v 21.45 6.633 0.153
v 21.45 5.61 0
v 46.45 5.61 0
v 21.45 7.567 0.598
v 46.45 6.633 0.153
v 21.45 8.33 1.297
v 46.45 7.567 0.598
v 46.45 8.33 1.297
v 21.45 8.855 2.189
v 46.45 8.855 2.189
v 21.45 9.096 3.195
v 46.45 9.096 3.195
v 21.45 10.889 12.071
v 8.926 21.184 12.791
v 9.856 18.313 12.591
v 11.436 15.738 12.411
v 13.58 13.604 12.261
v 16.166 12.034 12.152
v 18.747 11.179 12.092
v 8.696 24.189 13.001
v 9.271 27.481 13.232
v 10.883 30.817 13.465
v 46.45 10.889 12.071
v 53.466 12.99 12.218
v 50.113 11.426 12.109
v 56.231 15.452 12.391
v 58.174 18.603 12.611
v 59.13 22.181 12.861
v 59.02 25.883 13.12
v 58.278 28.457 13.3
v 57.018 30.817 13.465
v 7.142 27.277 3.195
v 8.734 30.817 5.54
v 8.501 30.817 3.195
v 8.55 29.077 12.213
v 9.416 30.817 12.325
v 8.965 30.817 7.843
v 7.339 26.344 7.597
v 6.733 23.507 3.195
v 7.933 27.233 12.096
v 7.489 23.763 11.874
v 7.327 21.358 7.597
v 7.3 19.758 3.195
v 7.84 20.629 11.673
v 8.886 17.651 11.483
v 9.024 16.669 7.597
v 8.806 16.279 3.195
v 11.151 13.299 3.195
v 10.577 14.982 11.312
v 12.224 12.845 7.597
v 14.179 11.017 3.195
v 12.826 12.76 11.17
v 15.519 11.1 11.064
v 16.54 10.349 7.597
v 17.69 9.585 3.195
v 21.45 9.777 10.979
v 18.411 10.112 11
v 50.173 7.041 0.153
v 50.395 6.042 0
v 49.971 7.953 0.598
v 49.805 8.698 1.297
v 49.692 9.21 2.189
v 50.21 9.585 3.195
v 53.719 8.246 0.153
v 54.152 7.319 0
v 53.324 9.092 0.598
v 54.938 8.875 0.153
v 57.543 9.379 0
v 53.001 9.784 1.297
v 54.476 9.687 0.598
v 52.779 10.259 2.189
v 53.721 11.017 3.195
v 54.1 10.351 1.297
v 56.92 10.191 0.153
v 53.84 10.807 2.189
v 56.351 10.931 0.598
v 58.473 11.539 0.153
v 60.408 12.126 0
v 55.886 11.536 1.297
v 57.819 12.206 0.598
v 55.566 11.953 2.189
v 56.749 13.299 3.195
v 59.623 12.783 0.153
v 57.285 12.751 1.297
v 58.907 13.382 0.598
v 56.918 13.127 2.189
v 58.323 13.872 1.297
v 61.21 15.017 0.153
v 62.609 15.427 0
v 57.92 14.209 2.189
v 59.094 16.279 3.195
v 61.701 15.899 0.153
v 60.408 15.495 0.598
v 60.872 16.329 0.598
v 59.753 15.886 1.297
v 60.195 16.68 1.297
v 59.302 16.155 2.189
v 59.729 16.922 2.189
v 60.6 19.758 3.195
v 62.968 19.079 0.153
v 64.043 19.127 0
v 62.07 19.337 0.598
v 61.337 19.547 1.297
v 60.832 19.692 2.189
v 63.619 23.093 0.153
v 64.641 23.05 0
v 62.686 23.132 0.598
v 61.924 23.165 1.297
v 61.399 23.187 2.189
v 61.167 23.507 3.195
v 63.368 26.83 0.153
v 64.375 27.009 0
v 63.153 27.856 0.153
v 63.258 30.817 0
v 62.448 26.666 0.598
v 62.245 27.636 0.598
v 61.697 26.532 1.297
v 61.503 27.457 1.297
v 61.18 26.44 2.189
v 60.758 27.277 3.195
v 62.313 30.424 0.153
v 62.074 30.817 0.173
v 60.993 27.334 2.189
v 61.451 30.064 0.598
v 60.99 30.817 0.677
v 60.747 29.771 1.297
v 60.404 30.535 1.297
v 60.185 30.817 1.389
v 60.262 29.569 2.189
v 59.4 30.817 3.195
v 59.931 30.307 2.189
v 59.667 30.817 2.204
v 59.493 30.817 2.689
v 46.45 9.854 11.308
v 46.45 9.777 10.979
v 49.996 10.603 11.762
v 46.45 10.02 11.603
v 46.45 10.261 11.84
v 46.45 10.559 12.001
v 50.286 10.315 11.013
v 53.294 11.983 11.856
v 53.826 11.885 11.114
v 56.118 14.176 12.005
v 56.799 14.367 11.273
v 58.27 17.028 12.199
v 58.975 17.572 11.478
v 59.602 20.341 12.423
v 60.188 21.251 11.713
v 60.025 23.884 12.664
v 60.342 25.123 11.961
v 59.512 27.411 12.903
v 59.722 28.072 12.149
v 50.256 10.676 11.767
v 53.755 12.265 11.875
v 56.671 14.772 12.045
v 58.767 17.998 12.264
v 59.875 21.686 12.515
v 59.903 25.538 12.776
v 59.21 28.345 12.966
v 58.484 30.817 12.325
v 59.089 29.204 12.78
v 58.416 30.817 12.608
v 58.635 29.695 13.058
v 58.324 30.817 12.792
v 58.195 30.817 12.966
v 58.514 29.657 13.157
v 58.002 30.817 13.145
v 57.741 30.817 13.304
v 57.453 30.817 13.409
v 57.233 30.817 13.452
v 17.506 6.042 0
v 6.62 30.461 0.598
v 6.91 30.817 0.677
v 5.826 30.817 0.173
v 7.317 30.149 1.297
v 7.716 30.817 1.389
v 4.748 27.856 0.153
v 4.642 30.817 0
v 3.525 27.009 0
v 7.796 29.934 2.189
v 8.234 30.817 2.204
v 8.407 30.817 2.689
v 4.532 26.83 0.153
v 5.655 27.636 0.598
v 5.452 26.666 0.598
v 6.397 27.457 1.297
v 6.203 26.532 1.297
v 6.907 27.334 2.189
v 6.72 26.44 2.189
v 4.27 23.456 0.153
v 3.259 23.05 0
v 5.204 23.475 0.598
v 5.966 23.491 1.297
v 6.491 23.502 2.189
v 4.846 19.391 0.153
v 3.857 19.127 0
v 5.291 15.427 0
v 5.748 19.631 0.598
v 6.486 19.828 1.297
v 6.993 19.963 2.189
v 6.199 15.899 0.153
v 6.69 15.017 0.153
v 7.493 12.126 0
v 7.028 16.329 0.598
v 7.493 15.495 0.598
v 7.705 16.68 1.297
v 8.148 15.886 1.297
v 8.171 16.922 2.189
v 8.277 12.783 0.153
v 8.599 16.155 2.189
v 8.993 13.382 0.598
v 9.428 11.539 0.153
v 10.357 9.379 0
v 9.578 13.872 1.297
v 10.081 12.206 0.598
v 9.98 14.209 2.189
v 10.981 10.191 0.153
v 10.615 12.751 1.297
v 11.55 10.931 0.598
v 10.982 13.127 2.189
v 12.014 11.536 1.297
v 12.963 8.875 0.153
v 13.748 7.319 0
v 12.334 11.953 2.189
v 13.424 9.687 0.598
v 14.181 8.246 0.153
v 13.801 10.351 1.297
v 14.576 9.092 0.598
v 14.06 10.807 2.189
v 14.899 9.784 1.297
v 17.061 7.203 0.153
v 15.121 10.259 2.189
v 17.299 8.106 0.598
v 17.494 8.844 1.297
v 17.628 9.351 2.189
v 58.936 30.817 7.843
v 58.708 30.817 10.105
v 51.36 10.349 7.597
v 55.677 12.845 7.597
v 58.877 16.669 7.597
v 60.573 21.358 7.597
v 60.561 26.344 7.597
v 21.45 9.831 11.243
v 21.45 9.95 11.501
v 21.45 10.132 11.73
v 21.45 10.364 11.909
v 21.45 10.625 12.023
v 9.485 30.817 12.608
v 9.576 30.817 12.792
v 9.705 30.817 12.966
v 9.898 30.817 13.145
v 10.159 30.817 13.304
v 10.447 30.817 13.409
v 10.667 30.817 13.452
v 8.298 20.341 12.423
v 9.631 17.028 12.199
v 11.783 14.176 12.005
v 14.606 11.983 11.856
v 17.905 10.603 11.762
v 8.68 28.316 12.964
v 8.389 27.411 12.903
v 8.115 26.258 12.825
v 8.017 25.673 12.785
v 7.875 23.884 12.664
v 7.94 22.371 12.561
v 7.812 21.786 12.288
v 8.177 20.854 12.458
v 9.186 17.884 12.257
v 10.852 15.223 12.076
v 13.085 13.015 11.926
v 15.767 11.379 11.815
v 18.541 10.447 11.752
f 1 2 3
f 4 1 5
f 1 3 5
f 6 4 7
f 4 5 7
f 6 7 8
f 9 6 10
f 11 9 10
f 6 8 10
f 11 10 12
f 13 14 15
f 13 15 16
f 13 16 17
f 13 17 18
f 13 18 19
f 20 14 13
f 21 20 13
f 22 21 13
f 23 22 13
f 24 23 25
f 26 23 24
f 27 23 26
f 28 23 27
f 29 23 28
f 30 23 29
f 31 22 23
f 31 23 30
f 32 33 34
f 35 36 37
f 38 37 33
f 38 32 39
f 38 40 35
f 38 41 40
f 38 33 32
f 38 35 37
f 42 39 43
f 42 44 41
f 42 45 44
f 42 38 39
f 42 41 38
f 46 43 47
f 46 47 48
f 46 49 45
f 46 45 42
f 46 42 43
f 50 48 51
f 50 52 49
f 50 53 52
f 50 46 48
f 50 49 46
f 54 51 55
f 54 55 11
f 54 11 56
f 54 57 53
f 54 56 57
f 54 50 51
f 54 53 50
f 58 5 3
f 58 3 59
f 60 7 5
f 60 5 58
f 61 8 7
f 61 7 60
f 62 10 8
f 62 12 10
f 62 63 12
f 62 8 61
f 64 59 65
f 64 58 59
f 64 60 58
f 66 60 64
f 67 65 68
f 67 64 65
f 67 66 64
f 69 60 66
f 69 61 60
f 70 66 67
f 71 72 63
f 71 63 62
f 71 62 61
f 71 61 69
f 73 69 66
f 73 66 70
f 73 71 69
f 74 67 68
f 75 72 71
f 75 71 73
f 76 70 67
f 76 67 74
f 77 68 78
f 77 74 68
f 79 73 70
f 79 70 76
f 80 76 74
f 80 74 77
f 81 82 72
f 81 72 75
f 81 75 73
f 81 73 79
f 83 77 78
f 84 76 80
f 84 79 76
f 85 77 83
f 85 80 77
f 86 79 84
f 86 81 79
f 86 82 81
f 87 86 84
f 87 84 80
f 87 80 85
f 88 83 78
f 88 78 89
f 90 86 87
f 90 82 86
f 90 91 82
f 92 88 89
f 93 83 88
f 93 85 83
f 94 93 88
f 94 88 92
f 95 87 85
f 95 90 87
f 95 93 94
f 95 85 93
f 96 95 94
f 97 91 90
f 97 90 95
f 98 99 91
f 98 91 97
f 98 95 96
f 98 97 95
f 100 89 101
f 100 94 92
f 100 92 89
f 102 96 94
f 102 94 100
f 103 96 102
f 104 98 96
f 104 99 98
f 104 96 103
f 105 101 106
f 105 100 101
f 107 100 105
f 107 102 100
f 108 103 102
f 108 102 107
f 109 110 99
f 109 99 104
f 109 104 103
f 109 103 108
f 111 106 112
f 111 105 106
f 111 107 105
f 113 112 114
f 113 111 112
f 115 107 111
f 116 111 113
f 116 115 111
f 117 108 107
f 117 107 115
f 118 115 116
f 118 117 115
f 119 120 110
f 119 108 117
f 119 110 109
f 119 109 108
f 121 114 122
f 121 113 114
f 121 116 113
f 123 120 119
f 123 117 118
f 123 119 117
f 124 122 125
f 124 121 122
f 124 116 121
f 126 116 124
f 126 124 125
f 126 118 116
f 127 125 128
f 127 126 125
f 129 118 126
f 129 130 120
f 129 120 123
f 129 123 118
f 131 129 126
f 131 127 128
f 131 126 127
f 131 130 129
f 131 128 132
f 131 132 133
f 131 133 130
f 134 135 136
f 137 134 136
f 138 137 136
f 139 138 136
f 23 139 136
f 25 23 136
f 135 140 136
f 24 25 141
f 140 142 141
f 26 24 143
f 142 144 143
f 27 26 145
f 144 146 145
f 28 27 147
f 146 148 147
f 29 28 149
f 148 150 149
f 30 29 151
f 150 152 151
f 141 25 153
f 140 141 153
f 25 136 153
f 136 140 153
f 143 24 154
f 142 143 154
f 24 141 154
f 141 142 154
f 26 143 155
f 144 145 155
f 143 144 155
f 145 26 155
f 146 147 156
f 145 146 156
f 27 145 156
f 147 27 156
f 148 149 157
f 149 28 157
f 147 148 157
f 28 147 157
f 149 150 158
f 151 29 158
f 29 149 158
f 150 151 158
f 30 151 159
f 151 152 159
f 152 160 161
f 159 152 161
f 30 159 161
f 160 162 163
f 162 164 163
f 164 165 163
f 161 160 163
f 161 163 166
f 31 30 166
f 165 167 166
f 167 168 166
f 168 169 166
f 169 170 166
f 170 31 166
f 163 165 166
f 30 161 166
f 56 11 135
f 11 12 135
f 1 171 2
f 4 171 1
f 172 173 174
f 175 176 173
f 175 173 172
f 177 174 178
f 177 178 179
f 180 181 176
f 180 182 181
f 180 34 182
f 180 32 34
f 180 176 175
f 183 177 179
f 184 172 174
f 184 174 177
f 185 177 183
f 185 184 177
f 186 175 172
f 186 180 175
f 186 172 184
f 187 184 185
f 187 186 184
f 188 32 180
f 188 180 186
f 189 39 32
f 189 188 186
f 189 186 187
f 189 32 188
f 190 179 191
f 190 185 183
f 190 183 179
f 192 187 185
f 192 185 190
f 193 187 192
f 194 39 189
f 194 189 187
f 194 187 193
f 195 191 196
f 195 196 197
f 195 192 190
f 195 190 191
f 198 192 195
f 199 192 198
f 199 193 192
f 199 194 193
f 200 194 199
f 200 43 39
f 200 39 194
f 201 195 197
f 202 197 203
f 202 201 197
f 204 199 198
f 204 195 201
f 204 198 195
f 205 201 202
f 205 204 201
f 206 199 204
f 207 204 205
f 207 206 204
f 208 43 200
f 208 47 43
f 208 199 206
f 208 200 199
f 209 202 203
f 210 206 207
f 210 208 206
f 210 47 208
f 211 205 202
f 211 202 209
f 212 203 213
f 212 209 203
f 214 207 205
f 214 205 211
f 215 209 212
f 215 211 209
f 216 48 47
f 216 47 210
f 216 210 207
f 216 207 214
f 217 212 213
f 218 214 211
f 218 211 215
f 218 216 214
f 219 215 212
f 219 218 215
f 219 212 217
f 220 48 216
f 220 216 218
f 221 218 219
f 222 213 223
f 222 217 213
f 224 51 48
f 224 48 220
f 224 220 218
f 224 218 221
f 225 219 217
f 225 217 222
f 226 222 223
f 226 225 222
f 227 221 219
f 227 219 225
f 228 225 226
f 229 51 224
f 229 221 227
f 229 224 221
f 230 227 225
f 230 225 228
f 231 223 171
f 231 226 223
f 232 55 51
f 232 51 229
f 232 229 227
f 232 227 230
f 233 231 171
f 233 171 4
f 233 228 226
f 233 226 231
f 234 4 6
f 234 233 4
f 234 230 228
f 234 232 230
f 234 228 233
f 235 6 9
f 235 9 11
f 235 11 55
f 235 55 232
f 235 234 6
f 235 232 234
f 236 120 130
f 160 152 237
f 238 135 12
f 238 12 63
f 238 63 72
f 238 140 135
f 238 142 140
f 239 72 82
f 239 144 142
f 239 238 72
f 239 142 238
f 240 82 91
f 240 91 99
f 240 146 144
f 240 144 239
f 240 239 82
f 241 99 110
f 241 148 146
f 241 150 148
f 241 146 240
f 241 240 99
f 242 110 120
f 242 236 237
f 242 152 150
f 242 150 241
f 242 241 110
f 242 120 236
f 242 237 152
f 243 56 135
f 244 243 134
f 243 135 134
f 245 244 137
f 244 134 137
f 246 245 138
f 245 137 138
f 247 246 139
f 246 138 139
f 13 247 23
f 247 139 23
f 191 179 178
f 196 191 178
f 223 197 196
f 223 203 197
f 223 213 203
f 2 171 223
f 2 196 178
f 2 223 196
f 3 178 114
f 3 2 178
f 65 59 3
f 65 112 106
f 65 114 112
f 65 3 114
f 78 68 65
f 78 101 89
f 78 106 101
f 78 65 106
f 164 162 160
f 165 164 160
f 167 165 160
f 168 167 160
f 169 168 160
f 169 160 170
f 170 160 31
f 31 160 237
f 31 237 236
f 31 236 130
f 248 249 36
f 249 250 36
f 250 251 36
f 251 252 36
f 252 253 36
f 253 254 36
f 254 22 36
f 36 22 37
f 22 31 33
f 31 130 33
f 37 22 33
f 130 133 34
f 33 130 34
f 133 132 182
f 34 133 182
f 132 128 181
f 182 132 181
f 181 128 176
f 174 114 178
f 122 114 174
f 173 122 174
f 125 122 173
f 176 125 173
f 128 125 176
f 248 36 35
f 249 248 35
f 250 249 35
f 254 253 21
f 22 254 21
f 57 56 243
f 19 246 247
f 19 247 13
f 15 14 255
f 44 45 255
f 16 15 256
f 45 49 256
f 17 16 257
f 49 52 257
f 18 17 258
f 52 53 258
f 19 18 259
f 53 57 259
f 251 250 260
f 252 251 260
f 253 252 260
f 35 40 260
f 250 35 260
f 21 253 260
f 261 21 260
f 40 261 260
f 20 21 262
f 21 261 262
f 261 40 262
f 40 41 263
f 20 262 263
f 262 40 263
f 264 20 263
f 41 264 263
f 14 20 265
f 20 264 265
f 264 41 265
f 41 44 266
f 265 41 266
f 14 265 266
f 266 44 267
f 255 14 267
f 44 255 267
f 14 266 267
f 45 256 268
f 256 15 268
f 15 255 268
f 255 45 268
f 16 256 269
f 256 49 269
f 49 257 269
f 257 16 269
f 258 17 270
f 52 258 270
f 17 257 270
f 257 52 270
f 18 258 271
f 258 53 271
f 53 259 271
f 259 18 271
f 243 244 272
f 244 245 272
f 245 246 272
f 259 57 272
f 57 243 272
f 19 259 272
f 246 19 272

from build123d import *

# Parameters (mm, degrees)
BOSS_EXTRUDE1_DEPTH = 12
BOSS_EXTRUDE1_TAPER = 5
SKETCH2_W           = 65.663584352
SKETCH2_H           = 13.360489219
CUT_EXTRUDE1_DEPTH  = 74.667326552
SKETCH3_W           = 72.132604944
SKETCH3_H           = 37.201111507
BOSS_EXTRUDE2_DEPTH = 10
FILLET1_R           = 3.5
SKETCH4_W           = 81.250289089
SKETCH4_H           = 16.618597718
CUT_EXTRUDE2_DEPTH  = 79.90066452
DRAFT2_ANGLE        = -4
FILLET3_R           = 1.2


with BuildPart() as part:
    # Sketch1 → Boss-Extrude1 (new body)
    with BuildSketch(Plane.XY):
        with BuildLine():
            Line((21.450148661, 8.816932272), (46.450148661, 8.816932272))
            ThreePointArc((46.450148661, 8.816932272), (61.450148661, 23.816932272), (46.450148661, 38.816932272))
            Line((46.450148661, 38.816932272), (21.450148661, 38.816932272))
            ThreePointArc((21.450148661, 38.816932272), (6.450148661, 23.816932272), (21.450148661, 8.816932272))
        make_face()
    extrude(amount=BOSS_EXTRUDE1_DEPTH, taper=BOSS_EXTRUDE1_TAPER)

    # Sketch2 → Cut-Extrude1 (cut, through all)
    with BuildSketch(Plane(origin=(0, 0, 0), x_dir=(-1, 0, 0), z_dir=(0, 0, -1))):
        with Locations((-32.000877842, 37.497176882)):
            Rectangle(SKETCH2_W, SKETCH2_H)
    extrude(amount=-CUT_EXTRUDE1_DEPTH, mode=Mode.SUBTRACT)

    # Sketch3 → Boss-Extrude2 (add)
    with BuildSketch(Plane(origin=(0, 0, 0), x_dir=(-1, 0, 0), z_dir=(0, 0, -1))):
        with Locations((-32.471221279, 19.407226217)):
            Rectangle(SKETCH3_W, SKETCH3_H)
    extrude(amount=BOSS_EXTRUDE2_DEPTH)

    # Fillet1
    fillet1_edges = [part.edges().sort_by_distance(p)[0] for p in [
        (59.295381239, 16.070965579, 0),
        (33.950148661, 8.816932272, 0),
        (8.604916082, 16.070965579, 0),
    ]]
    fillet(fillet1_edges, radius=FILLET1_R)

    # Sketch4 → Cut-Extrude2 (cut, through all)
    with BuildSketch(Plane.XZ.offset(-0.806670463)):
        with Locations((37.030063352, -8.309298859)):
            Rectangle(SKETCH4_W, SKETCH4_H)
    extrude(amount=-CUT_EXTRUDE2_DEPTH, mode=Mode.SUBTRACT)

    # Draft2
    draft2_faces = [part.faces().sort_by_distance(p)[0] for p in [
        (33.950148661, 20.873226907, 12),
    ]]
    draft(draft2_faces, Plane.ZX.offset(9.866796234), DRAFT2_ANGLE)

    # Fillet3
    fillet3_edges = [part.edges().sort_by_distance(p)[0] for p in [
        (58.506945165, 16.885570637, 12.490800518),
        (33.950148661, 9.866796234, 12),
        (9.393352156, 16.885570637, 12.490800518),
    ]]
    fillet(fillet3_edges, radius=FILLET3_R)


solid = part.part
